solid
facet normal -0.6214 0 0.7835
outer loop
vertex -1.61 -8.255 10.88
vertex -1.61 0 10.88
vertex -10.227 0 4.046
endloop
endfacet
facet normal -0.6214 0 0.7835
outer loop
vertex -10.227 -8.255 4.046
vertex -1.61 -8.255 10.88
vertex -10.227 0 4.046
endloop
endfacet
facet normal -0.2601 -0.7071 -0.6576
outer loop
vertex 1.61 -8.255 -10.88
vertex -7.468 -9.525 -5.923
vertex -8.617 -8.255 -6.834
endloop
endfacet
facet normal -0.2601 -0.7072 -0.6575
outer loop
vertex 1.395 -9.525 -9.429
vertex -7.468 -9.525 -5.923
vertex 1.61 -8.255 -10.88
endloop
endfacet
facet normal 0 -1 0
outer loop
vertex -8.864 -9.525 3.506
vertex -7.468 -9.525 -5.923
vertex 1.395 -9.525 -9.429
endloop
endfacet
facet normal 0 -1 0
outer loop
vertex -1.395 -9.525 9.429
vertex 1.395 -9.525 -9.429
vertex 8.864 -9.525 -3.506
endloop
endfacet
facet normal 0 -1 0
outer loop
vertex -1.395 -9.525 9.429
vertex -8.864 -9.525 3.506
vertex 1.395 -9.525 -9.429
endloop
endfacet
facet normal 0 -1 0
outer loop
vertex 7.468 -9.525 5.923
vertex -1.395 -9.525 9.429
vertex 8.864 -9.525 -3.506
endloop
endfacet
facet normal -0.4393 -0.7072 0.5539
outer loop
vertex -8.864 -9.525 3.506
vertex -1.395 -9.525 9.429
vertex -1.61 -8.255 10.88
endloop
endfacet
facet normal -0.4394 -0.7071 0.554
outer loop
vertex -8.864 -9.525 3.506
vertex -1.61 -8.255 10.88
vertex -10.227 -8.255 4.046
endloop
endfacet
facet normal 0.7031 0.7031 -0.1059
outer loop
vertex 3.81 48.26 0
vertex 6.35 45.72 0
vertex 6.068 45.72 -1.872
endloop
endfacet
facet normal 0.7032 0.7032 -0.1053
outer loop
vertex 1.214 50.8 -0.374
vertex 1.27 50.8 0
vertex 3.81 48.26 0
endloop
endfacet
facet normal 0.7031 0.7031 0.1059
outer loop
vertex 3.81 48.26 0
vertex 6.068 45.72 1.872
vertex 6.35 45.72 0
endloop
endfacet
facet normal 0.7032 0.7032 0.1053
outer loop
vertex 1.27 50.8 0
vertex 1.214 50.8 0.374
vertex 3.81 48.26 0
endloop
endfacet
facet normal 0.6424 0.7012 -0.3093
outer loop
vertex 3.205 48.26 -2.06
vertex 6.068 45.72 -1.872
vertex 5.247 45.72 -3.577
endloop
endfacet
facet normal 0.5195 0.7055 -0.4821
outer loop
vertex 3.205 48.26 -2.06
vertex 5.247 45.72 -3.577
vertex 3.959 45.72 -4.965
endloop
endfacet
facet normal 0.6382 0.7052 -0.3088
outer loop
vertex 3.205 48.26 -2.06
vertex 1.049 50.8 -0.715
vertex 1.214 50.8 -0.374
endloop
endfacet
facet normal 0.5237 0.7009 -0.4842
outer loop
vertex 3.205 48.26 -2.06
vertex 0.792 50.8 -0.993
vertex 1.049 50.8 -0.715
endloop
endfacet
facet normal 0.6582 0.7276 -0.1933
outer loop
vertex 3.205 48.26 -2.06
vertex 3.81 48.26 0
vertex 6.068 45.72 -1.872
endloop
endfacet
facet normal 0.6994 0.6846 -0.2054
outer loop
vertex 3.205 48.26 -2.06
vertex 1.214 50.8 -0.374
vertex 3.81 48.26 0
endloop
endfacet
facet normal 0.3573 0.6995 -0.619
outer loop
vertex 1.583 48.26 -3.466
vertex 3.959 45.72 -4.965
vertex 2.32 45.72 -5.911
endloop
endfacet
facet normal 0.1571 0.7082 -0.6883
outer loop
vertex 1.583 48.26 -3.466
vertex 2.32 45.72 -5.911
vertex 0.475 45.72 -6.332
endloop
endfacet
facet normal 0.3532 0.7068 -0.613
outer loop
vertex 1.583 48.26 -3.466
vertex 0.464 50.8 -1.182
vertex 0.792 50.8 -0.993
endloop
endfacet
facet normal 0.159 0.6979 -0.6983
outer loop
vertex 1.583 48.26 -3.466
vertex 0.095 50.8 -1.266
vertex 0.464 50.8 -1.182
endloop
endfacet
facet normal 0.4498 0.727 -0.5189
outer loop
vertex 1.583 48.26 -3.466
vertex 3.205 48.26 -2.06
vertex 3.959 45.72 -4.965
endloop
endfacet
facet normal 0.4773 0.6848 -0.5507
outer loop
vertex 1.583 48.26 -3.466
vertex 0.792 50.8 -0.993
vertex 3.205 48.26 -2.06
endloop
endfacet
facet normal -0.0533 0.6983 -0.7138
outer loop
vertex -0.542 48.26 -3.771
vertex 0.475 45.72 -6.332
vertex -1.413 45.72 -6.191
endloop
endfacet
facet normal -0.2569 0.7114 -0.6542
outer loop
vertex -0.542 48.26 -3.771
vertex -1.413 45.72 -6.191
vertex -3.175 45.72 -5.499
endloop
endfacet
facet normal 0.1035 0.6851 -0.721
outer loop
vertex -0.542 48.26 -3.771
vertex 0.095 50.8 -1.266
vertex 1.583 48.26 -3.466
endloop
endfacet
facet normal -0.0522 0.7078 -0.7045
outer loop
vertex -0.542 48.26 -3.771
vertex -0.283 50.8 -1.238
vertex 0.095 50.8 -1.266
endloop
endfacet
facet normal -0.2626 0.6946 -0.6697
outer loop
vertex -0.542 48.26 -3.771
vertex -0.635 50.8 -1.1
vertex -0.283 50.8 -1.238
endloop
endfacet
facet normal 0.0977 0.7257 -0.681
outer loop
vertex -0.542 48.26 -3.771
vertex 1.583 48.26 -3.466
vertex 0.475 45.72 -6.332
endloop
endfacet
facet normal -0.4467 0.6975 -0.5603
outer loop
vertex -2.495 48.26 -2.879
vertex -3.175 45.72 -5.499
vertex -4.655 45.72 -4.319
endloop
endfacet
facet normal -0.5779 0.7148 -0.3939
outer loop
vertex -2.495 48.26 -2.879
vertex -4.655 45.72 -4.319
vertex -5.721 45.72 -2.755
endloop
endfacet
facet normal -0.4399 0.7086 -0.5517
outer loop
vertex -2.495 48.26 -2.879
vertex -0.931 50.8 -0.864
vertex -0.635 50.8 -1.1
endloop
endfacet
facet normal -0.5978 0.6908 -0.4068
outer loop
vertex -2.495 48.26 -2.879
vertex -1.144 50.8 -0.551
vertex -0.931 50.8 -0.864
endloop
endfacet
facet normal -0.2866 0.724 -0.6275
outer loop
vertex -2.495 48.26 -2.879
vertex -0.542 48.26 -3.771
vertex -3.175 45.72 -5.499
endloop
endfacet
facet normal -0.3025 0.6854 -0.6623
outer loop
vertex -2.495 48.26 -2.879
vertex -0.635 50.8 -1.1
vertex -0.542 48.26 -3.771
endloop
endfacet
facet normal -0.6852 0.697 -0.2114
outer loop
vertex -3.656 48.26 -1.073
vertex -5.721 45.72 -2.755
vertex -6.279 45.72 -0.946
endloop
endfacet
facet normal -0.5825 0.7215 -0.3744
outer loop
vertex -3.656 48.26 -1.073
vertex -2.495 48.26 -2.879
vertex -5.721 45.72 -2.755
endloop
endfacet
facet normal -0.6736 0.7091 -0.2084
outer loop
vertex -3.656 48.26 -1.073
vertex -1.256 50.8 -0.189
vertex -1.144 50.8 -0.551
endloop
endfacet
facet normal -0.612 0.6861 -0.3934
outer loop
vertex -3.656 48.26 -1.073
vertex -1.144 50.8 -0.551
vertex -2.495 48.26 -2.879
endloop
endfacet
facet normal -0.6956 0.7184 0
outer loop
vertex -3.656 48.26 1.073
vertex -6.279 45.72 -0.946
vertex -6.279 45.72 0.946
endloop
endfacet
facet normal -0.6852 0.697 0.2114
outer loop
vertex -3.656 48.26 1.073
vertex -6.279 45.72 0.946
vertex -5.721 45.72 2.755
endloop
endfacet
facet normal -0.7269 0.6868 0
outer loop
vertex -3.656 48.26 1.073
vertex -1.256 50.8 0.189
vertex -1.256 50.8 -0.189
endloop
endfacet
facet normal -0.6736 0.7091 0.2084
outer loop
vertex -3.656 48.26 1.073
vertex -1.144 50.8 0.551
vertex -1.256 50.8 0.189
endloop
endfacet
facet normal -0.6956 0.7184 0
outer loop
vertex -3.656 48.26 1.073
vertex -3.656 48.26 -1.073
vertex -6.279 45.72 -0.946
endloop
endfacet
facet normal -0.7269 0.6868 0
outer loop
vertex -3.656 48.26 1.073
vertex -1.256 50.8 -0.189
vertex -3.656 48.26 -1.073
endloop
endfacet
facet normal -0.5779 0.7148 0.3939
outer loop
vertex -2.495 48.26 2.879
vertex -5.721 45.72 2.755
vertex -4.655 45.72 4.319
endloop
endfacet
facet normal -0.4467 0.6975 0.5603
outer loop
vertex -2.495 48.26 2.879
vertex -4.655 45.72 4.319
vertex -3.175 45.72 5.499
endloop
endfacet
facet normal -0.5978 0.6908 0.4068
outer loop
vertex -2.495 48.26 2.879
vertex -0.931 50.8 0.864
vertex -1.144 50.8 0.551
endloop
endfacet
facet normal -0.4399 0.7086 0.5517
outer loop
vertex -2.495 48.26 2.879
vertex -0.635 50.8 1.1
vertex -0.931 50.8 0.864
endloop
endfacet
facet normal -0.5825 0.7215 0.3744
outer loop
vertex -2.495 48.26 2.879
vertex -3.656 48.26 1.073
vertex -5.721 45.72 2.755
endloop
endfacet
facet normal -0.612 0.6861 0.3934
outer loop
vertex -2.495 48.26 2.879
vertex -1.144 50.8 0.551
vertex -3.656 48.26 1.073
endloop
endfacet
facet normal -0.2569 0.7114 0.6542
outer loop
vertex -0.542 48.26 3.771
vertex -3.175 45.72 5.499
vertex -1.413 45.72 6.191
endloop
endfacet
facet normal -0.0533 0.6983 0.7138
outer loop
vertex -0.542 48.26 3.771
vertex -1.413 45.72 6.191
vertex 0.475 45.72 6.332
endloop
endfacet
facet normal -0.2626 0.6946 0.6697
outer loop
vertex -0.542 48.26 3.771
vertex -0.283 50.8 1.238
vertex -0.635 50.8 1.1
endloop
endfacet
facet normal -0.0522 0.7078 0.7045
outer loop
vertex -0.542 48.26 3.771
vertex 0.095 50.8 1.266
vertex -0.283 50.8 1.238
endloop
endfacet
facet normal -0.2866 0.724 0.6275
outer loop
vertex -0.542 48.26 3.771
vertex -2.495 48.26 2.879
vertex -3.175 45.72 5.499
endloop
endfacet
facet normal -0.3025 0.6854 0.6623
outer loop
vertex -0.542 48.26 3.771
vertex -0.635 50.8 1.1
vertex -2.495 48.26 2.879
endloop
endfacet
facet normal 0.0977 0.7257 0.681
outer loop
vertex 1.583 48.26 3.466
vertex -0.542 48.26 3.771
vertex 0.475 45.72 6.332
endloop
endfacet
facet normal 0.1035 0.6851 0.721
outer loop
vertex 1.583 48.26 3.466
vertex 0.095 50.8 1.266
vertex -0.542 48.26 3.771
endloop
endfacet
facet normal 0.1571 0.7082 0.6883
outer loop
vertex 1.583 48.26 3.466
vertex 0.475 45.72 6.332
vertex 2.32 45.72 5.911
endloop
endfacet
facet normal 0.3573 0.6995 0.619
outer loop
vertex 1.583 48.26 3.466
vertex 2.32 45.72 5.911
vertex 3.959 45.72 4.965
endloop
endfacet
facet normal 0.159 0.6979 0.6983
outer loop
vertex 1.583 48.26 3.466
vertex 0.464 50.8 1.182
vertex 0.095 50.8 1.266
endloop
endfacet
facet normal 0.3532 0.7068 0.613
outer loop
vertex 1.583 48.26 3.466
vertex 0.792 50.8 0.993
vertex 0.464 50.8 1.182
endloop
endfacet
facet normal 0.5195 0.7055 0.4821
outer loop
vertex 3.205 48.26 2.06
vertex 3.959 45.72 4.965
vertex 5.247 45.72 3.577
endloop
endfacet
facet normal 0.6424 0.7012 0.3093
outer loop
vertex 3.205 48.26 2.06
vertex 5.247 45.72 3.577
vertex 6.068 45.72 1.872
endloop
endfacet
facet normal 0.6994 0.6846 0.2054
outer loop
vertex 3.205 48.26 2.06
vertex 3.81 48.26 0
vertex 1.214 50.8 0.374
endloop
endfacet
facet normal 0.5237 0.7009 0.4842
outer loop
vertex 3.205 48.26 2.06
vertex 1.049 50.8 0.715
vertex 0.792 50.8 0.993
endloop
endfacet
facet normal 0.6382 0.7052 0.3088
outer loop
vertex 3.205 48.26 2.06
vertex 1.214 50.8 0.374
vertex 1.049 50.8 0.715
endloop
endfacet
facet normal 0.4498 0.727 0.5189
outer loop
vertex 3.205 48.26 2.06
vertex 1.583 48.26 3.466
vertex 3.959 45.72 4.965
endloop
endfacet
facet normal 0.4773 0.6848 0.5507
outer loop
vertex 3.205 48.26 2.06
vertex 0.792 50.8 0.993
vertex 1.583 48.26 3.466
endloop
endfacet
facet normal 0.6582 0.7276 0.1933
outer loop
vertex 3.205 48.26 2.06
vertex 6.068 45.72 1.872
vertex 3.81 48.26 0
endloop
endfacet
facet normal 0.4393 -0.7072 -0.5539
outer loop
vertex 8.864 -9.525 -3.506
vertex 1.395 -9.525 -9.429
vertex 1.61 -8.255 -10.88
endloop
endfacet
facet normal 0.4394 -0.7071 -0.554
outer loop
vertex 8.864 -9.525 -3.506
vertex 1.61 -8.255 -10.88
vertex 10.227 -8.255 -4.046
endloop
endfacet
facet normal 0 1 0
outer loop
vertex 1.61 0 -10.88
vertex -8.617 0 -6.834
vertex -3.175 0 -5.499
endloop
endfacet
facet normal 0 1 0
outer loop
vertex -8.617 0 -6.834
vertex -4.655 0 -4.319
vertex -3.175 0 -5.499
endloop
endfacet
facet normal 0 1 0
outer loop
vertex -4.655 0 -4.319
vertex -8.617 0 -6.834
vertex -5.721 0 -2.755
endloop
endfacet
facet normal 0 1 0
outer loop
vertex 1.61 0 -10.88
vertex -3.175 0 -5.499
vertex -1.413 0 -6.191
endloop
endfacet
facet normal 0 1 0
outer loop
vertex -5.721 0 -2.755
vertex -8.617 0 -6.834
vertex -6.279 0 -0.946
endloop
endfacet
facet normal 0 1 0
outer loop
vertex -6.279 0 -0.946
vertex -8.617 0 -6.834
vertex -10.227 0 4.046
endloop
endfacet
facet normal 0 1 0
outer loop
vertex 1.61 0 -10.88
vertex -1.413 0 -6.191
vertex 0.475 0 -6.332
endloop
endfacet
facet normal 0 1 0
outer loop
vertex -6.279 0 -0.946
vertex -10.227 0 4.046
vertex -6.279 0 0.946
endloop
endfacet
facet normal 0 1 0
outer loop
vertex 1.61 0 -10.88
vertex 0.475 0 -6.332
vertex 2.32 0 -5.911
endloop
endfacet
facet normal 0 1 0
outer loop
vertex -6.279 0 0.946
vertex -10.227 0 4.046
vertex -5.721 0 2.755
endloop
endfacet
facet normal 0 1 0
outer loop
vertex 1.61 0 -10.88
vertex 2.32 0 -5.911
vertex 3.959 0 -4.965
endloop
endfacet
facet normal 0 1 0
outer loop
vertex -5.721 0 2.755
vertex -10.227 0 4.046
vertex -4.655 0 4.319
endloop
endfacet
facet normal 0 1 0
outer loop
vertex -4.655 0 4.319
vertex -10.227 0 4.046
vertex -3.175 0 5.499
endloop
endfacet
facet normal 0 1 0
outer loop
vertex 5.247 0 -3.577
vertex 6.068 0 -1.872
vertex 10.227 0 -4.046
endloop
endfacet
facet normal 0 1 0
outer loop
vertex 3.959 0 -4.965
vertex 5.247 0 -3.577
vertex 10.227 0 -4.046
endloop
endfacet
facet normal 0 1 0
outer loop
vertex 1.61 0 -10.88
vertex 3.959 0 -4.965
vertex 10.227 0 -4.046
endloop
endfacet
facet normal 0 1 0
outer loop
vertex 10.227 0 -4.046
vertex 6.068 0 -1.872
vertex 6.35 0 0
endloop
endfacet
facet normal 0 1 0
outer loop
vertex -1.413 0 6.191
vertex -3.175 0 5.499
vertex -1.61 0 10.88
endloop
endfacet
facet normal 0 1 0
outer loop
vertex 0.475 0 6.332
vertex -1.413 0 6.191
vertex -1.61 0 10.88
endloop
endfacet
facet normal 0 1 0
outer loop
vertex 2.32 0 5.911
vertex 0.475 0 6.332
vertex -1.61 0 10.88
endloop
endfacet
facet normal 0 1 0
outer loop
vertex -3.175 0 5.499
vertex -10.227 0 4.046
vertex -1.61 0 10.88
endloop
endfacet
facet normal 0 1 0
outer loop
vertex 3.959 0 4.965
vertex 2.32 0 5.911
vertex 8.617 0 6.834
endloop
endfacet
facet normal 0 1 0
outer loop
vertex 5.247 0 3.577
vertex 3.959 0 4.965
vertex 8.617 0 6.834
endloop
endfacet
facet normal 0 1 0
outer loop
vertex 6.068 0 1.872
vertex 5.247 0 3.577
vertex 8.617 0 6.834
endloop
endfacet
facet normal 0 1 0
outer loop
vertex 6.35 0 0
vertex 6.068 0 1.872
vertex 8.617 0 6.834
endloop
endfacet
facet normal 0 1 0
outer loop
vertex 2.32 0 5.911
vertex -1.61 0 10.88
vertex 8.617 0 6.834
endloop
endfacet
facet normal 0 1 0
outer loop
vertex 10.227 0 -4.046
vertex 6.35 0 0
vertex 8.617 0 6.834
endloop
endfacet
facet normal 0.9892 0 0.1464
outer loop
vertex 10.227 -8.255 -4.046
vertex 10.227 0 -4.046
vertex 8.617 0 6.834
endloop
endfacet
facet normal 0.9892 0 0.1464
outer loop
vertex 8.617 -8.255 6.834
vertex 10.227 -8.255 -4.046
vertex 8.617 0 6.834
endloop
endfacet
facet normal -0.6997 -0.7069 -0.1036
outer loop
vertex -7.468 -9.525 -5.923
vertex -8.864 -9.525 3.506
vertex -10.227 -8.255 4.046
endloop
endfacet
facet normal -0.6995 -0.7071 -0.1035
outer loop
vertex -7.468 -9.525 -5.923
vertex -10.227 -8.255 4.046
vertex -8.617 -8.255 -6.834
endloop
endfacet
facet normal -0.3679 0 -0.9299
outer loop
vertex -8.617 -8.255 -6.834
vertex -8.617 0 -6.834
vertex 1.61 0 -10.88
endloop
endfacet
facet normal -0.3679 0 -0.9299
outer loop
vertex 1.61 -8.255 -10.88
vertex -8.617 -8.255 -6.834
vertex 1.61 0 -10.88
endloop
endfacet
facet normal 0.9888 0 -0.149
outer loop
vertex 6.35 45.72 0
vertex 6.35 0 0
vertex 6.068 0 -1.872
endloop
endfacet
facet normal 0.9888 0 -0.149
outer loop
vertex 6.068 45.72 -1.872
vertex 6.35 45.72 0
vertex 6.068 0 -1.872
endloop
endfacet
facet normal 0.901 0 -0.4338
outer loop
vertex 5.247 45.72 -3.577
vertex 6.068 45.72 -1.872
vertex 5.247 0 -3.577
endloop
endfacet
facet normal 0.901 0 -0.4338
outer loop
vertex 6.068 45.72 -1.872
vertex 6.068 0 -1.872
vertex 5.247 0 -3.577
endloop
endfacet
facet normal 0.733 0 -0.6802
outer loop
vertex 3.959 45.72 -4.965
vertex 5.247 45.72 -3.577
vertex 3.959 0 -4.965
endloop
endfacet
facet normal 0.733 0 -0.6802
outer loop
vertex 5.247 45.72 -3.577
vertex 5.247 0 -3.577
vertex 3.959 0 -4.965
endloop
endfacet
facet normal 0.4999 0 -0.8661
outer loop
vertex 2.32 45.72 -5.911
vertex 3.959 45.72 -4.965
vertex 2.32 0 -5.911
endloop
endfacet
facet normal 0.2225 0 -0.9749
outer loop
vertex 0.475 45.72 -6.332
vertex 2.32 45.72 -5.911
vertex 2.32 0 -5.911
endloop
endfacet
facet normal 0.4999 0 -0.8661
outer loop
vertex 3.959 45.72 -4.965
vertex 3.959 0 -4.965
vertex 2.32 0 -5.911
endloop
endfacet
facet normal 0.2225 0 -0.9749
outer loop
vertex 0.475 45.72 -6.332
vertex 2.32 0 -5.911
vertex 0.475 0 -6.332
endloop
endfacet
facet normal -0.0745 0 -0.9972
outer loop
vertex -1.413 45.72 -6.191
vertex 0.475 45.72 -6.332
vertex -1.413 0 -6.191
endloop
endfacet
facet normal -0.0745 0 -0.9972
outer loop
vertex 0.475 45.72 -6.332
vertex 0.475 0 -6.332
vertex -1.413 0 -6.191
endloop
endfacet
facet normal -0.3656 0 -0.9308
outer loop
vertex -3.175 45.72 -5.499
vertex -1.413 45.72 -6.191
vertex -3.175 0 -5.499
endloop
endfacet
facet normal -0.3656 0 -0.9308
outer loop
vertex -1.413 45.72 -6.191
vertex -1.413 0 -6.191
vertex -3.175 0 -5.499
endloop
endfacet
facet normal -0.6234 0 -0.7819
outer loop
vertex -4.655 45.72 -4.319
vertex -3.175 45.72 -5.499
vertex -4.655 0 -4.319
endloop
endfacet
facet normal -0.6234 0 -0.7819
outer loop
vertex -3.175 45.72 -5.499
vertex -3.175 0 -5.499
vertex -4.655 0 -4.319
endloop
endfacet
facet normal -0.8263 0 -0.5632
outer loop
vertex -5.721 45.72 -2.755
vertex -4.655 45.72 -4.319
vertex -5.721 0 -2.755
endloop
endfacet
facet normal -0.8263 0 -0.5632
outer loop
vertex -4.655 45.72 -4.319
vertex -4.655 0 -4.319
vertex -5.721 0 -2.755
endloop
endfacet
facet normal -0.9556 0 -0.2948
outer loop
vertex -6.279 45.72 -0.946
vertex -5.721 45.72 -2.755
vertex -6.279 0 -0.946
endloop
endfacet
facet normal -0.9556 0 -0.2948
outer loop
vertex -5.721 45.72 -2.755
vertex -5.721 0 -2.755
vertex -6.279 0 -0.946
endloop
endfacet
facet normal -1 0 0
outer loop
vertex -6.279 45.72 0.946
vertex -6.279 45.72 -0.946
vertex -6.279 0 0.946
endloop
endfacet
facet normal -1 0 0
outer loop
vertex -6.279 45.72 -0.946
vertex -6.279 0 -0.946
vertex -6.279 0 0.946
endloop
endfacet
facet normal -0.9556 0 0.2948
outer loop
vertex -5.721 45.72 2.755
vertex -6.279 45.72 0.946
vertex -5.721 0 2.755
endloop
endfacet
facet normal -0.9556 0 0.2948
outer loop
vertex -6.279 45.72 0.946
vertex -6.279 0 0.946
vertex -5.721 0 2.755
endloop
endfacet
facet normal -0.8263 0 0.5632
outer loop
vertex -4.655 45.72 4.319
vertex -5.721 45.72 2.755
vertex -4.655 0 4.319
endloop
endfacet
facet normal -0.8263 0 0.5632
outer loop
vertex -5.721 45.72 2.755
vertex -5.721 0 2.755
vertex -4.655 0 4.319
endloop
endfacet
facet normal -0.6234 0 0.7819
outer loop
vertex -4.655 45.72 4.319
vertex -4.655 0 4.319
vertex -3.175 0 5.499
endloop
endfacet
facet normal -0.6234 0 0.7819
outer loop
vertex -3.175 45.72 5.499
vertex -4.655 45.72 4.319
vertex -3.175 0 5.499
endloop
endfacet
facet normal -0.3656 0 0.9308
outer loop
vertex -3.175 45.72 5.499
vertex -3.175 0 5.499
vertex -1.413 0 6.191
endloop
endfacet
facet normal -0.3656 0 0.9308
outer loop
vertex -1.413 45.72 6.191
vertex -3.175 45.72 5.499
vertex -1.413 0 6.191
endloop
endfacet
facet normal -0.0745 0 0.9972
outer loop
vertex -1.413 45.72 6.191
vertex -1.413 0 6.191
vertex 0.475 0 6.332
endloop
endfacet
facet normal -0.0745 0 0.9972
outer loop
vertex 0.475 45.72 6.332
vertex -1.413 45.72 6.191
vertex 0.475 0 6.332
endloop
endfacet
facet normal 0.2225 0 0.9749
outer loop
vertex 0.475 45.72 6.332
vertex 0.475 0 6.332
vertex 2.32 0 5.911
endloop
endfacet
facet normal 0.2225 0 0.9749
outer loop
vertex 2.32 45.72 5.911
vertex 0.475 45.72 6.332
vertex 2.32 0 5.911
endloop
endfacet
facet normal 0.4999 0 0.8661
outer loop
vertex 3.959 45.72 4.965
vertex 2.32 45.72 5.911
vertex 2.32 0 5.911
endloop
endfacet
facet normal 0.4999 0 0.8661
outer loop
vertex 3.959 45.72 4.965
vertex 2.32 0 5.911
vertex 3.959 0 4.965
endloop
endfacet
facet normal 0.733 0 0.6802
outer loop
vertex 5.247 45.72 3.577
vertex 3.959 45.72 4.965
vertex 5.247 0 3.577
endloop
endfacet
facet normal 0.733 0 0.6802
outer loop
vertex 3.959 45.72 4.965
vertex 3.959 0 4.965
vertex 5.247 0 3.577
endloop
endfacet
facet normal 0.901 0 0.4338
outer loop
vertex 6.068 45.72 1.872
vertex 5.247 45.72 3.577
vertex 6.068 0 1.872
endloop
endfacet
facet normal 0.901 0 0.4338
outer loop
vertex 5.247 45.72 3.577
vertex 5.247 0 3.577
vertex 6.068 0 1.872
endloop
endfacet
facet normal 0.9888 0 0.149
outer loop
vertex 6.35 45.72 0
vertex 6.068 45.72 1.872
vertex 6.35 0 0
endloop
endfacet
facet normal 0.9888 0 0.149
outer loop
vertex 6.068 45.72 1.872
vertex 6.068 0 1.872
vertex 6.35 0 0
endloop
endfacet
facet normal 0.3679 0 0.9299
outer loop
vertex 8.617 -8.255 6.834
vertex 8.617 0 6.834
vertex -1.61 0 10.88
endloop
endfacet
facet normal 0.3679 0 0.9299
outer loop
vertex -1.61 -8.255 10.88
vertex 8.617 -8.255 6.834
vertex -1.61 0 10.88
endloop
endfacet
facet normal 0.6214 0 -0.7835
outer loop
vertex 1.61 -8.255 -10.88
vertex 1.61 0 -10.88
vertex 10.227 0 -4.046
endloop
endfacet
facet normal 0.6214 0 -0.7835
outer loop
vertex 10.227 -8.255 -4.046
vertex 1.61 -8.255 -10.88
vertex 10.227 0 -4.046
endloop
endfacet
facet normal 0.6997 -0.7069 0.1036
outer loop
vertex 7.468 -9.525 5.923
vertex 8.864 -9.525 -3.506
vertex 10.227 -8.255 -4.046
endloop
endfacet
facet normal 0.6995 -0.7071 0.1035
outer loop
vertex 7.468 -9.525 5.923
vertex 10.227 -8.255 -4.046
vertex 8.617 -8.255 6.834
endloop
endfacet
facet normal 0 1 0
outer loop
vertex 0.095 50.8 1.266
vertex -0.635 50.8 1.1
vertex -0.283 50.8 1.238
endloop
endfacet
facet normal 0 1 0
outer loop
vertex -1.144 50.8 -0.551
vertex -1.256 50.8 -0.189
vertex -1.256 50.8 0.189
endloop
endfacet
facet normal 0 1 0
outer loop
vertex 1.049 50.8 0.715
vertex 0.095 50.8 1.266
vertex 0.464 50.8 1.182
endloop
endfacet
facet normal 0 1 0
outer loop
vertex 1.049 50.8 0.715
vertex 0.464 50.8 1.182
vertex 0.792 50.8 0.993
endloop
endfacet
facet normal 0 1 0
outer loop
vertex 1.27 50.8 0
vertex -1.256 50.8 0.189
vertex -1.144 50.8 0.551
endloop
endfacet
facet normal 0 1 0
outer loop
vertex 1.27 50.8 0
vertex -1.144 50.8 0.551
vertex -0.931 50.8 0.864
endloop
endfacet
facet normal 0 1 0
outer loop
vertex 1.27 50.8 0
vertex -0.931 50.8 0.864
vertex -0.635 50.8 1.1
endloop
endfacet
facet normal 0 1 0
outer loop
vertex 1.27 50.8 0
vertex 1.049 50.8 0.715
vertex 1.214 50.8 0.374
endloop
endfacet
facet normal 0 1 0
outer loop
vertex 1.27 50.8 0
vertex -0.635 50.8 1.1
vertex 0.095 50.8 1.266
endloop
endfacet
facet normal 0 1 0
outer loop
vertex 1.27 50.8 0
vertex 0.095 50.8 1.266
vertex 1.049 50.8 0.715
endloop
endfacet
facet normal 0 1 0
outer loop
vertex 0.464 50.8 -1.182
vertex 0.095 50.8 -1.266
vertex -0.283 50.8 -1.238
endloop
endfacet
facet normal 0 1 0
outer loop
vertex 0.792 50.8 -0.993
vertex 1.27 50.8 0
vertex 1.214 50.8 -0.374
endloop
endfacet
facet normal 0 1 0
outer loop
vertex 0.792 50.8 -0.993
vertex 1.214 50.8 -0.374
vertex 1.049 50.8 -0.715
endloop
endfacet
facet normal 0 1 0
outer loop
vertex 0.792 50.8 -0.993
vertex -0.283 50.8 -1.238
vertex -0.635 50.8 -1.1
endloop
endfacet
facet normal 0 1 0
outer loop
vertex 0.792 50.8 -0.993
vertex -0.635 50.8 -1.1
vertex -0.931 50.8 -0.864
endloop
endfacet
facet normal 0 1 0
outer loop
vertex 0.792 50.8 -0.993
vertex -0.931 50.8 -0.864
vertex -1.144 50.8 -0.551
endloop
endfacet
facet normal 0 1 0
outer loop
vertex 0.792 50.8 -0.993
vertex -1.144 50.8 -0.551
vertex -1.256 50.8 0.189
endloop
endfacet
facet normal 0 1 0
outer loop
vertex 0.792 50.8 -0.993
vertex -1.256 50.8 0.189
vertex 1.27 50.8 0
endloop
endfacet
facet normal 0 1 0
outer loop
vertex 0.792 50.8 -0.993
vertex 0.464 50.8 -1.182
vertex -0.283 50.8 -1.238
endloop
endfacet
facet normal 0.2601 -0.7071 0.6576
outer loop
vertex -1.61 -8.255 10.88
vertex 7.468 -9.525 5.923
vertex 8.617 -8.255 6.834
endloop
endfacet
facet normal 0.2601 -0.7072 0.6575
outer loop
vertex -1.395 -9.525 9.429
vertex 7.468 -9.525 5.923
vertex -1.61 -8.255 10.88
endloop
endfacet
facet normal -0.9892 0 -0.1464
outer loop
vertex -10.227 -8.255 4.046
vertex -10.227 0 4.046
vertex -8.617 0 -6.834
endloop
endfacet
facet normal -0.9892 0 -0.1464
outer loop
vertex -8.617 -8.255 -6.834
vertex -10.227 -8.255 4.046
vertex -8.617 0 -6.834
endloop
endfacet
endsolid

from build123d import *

# Parameters (mm, degrees)
F1_DEPTH = 9.525
F3_R     = 6.35
F4_DEPTH = 50.8
F5_SIZE  = 5.08
F6_SIZE  = 1.27


with BuildPart() as f1:
    # F0 (on Front) → F1 (new body)
    with BuildSketch(Plane.XZ):
        Polygon((-1.610126, 10.880027), (-10.227443, 4.045603), (-8.617317, -6.834424), (1.610126, -10.880027), (10.227443, -4.045603), (8.617317, 6.834424), align=None)
    extrude(amount=F1_DEPTH)

    # F3 (on offset) → F4 (join)
    with BuildSketch(Plane(origin=(0, 0, 0), x_dir=(1, 0, 0), z_dir=(0, 1, 0))):
        Circle(F3_R)
    extrude(amount=F4_DEPTH)

    # F5
    f5_edges = [f1.edges().sort_by_distance(p)[0] for p in [
        (-6.35, 50.8, 0),
    ]]
    chamfer(f5_edges, length=F5_SIZE)

    # F6
    f6_edges = [f1.edges().sort_by_distance(p)[0] for p in [
        (-5.918785, -9.525, 7.462815),
        (3.503595, -9.525, 8.857226),
        (9.42238, -9.525, 1.39441),
        (5.918785, -9.525, -7.462815),
        (-3.503595, -9.525, -8.857226),
        (-9.42238, -9.525, -1.39441),
    ]]
    chamfer(f6_edges, length=F6_SIZE)


solid = f1.part
